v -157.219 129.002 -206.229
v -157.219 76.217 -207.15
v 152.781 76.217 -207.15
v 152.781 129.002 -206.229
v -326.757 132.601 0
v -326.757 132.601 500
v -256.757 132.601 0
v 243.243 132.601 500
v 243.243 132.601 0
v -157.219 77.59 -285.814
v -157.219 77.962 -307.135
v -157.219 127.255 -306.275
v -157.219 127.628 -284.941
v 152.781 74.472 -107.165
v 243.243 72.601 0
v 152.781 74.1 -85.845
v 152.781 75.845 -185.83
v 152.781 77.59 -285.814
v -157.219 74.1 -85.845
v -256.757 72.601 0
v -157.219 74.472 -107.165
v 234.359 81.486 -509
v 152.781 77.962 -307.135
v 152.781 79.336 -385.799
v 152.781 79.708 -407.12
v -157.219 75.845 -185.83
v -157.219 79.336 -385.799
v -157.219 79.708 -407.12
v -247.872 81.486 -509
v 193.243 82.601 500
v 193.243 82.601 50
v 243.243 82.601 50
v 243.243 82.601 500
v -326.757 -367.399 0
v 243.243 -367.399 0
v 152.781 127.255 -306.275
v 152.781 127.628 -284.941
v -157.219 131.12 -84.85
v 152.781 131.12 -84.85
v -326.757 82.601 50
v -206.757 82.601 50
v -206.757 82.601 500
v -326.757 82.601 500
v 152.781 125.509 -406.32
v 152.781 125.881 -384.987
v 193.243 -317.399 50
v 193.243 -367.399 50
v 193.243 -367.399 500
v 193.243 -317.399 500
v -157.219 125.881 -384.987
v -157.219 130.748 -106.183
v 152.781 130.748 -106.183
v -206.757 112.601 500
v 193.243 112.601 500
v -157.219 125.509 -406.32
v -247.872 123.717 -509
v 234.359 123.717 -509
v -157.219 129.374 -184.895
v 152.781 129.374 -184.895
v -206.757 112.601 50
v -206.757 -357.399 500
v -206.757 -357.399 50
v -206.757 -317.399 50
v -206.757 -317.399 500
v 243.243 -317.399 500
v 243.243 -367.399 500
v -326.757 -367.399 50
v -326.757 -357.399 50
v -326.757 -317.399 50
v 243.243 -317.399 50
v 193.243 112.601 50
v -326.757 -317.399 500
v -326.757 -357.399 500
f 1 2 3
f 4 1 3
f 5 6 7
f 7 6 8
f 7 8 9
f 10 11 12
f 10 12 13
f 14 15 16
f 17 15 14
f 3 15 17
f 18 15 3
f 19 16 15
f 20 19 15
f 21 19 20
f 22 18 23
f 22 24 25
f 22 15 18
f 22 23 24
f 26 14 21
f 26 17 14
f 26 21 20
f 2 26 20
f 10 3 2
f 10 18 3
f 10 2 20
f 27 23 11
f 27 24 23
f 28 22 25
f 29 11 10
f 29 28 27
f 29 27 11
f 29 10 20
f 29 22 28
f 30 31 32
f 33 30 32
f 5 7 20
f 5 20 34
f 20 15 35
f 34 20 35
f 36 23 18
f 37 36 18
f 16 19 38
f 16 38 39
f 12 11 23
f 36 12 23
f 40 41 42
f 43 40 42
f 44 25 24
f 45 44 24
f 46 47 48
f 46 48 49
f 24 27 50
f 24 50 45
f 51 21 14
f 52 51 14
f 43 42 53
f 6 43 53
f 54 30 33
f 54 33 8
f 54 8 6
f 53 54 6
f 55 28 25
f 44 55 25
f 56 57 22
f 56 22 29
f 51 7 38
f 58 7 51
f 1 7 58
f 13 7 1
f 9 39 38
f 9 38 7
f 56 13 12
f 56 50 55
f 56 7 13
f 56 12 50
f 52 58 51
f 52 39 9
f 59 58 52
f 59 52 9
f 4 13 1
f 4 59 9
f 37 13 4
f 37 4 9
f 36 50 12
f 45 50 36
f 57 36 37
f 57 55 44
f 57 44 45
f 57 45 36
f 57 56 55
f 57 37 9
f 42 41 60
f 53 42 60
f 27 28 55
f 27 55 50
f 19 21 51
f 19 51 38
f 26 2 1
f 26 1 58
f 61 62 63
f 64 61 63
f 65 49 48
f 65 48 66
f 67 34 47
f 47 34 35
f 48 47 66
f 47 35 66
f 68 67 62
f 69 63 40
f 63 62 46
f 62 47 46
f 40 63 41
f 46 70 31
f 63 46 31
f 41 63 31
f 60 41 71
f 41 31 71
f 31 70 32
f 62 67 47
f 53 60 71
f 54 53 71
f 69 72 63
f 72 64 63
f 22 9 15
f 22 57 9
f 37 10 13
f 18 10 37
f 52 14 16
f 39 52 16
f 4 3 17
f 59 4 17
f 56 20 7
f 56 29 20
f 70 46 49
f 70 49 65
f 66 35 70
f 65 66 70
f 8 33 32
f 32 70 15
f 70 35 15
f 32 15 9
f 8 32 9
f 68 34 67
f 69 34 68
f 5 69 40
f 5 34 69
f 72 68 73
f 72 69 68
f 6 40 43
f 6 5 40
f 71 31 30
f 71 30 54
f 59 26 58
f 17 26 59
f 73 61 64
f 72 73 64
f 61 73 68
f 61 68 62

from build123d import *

# Parameters (mm, degrees)
SKETCH1_W           = 500
SKETCH1_H           = 500
BOSS_EXTRUDE1_DEPTH = 50
SKETCH2_W           = 50
SKETCH2_H           = 50
BOSS_EXTRUDE2_DEPTH = 450
SKETCH3_W           = 400
SKETCH3_H           = 20
BOSS_EXTRUDE3_DEPTH = 450
SKETCH4_W           = 500
SKETCH4_H           = 60
BOSS_EXTRUDE4_DEPTH = 509
BOSS_EXTRUDE4_TAPER = 1
SKETCH5_W           = 310
SKETCH5_H           = 21.323695684
CUT_EXTRUDE1_DEPTH  = 509
BOSS_EXTRUDE5_DEPTH = 70
SKETCH7_W           = 120
SKETCH7_H           = 450
CUT_EXTRUDE2_DEPTH  = 10


with BuildPart() as part:
    # Sketch1 → Boss-Extrude1 (new body)
    with BuildSketch(Plane.XY):
        with Locations((-6.756756757, -117.398648649)):
            Rectangle(SKETCH1_W, SKETCH1_H)
    extrude(amount=BOSS_EXTRUDE1_DEPTH)

    # Sketch2 → Boss-Extrude2 (add)
    with BuildSketch(Plane.XY.offset(50)):
        with Locations((-231.756756757, 107.601351351)):
            Rectangle(SKETCH2_W, SKETCH2_H)
        with Locations((218.243243243, 107.601351351)):
            Rectangle(SKETCH2_W, SKETCH2_H)
        with Locations((218.243243243, -342.398648649)):
            Rectangle(SKETCH2_W, SKETCH2_H)
        with Locations((-231.756756757, -342.398648649)):
            Rectangle(SKETCH2_W, SKETCH2_H)
    extrude(amount=BOSS_EXTRUDE2_DEPTH)

    # Sketch3 → Boss-Extrude3 (add)
    with BuildSketch(Plane.XY.offset(50)):
        with Locations((-6.756756757, 122.601351351)):
            Rectangle(SKETCH3_W, SKETCH3_H)
    extrude(amount=BOSS_EXTRUDE3_DEPTH)

    # Sketch4 → Boss-Extrude4 (add)
    with BuildSketch(Plane(origin=(0, 0, 0), x_dir=(-1, 0, 0), z_dir=(0, 0, -1))):
        with Locations((6.756756757, 102.601351351)):
            Rectangle(SKETCH4_W, SKETCH4_H)
    extrude(amount=BOSS_EXTRUDE4_DEPTH, taper=BOSS_EXTRUDE4_TAPER)

    # Sketch5 → Cut-Extrude1 (cut)
    with BuildSketch(Plane(origin=(0, 72.579237961, 1.266875311), x_dir=(1, 0, 0), z_dir=(0, -0.9998476951563913, -0.01745240643728355))):
        with Locations((-2.218768488, -397.78694869)):
            Rectangle(SKETCH5_W, SKETCH5_H)
        with Locations((-2.218768488, -297.78694869)):
            Rectangle(SKETCH5_W, SKETCH5_H)
        with Locations((-2.218768488, -197.78694869)):
            Rectangle(SKETCH5_W, SKETCH5_H)
        with Locations((-2.218768488, -97.78694869)):
            Rectangle(SKETCH5_W, SKETCH5_H)
    extrude(amount=-CUT_EXTRUDE1_DEPTH, mode=Mode.SUBTRACT)

    # Sketch6 → Boss-Extrude5 (add)
    with BuildSketch(Plane.ZY.offset(256.756756757)):
        Polygon((500, 132.601351351), (0, 132.601351351), (0, -367.398648649), (500, -367.398648649), (500, -317.398648649), (50, -317.398648649), (50, 82.601351351), (500, 82.601351351), align=None)
    extrude(amount=BOSS_EXTRUDE5_DEPTH)

    # Sketch7 → Cut-Extrude2 (cut)
    with BuildSketch(Plane.XZ.offset(367.398648649)):
        with Locations((-266.756756757, 275)):
            Rectangle(SKETCH7_W, SKETCH7_H)
    extrude(amount=-CUT_EXTRUDE2_DEPTH, mode=Mode.SUBTRACT)


solid = part.part
